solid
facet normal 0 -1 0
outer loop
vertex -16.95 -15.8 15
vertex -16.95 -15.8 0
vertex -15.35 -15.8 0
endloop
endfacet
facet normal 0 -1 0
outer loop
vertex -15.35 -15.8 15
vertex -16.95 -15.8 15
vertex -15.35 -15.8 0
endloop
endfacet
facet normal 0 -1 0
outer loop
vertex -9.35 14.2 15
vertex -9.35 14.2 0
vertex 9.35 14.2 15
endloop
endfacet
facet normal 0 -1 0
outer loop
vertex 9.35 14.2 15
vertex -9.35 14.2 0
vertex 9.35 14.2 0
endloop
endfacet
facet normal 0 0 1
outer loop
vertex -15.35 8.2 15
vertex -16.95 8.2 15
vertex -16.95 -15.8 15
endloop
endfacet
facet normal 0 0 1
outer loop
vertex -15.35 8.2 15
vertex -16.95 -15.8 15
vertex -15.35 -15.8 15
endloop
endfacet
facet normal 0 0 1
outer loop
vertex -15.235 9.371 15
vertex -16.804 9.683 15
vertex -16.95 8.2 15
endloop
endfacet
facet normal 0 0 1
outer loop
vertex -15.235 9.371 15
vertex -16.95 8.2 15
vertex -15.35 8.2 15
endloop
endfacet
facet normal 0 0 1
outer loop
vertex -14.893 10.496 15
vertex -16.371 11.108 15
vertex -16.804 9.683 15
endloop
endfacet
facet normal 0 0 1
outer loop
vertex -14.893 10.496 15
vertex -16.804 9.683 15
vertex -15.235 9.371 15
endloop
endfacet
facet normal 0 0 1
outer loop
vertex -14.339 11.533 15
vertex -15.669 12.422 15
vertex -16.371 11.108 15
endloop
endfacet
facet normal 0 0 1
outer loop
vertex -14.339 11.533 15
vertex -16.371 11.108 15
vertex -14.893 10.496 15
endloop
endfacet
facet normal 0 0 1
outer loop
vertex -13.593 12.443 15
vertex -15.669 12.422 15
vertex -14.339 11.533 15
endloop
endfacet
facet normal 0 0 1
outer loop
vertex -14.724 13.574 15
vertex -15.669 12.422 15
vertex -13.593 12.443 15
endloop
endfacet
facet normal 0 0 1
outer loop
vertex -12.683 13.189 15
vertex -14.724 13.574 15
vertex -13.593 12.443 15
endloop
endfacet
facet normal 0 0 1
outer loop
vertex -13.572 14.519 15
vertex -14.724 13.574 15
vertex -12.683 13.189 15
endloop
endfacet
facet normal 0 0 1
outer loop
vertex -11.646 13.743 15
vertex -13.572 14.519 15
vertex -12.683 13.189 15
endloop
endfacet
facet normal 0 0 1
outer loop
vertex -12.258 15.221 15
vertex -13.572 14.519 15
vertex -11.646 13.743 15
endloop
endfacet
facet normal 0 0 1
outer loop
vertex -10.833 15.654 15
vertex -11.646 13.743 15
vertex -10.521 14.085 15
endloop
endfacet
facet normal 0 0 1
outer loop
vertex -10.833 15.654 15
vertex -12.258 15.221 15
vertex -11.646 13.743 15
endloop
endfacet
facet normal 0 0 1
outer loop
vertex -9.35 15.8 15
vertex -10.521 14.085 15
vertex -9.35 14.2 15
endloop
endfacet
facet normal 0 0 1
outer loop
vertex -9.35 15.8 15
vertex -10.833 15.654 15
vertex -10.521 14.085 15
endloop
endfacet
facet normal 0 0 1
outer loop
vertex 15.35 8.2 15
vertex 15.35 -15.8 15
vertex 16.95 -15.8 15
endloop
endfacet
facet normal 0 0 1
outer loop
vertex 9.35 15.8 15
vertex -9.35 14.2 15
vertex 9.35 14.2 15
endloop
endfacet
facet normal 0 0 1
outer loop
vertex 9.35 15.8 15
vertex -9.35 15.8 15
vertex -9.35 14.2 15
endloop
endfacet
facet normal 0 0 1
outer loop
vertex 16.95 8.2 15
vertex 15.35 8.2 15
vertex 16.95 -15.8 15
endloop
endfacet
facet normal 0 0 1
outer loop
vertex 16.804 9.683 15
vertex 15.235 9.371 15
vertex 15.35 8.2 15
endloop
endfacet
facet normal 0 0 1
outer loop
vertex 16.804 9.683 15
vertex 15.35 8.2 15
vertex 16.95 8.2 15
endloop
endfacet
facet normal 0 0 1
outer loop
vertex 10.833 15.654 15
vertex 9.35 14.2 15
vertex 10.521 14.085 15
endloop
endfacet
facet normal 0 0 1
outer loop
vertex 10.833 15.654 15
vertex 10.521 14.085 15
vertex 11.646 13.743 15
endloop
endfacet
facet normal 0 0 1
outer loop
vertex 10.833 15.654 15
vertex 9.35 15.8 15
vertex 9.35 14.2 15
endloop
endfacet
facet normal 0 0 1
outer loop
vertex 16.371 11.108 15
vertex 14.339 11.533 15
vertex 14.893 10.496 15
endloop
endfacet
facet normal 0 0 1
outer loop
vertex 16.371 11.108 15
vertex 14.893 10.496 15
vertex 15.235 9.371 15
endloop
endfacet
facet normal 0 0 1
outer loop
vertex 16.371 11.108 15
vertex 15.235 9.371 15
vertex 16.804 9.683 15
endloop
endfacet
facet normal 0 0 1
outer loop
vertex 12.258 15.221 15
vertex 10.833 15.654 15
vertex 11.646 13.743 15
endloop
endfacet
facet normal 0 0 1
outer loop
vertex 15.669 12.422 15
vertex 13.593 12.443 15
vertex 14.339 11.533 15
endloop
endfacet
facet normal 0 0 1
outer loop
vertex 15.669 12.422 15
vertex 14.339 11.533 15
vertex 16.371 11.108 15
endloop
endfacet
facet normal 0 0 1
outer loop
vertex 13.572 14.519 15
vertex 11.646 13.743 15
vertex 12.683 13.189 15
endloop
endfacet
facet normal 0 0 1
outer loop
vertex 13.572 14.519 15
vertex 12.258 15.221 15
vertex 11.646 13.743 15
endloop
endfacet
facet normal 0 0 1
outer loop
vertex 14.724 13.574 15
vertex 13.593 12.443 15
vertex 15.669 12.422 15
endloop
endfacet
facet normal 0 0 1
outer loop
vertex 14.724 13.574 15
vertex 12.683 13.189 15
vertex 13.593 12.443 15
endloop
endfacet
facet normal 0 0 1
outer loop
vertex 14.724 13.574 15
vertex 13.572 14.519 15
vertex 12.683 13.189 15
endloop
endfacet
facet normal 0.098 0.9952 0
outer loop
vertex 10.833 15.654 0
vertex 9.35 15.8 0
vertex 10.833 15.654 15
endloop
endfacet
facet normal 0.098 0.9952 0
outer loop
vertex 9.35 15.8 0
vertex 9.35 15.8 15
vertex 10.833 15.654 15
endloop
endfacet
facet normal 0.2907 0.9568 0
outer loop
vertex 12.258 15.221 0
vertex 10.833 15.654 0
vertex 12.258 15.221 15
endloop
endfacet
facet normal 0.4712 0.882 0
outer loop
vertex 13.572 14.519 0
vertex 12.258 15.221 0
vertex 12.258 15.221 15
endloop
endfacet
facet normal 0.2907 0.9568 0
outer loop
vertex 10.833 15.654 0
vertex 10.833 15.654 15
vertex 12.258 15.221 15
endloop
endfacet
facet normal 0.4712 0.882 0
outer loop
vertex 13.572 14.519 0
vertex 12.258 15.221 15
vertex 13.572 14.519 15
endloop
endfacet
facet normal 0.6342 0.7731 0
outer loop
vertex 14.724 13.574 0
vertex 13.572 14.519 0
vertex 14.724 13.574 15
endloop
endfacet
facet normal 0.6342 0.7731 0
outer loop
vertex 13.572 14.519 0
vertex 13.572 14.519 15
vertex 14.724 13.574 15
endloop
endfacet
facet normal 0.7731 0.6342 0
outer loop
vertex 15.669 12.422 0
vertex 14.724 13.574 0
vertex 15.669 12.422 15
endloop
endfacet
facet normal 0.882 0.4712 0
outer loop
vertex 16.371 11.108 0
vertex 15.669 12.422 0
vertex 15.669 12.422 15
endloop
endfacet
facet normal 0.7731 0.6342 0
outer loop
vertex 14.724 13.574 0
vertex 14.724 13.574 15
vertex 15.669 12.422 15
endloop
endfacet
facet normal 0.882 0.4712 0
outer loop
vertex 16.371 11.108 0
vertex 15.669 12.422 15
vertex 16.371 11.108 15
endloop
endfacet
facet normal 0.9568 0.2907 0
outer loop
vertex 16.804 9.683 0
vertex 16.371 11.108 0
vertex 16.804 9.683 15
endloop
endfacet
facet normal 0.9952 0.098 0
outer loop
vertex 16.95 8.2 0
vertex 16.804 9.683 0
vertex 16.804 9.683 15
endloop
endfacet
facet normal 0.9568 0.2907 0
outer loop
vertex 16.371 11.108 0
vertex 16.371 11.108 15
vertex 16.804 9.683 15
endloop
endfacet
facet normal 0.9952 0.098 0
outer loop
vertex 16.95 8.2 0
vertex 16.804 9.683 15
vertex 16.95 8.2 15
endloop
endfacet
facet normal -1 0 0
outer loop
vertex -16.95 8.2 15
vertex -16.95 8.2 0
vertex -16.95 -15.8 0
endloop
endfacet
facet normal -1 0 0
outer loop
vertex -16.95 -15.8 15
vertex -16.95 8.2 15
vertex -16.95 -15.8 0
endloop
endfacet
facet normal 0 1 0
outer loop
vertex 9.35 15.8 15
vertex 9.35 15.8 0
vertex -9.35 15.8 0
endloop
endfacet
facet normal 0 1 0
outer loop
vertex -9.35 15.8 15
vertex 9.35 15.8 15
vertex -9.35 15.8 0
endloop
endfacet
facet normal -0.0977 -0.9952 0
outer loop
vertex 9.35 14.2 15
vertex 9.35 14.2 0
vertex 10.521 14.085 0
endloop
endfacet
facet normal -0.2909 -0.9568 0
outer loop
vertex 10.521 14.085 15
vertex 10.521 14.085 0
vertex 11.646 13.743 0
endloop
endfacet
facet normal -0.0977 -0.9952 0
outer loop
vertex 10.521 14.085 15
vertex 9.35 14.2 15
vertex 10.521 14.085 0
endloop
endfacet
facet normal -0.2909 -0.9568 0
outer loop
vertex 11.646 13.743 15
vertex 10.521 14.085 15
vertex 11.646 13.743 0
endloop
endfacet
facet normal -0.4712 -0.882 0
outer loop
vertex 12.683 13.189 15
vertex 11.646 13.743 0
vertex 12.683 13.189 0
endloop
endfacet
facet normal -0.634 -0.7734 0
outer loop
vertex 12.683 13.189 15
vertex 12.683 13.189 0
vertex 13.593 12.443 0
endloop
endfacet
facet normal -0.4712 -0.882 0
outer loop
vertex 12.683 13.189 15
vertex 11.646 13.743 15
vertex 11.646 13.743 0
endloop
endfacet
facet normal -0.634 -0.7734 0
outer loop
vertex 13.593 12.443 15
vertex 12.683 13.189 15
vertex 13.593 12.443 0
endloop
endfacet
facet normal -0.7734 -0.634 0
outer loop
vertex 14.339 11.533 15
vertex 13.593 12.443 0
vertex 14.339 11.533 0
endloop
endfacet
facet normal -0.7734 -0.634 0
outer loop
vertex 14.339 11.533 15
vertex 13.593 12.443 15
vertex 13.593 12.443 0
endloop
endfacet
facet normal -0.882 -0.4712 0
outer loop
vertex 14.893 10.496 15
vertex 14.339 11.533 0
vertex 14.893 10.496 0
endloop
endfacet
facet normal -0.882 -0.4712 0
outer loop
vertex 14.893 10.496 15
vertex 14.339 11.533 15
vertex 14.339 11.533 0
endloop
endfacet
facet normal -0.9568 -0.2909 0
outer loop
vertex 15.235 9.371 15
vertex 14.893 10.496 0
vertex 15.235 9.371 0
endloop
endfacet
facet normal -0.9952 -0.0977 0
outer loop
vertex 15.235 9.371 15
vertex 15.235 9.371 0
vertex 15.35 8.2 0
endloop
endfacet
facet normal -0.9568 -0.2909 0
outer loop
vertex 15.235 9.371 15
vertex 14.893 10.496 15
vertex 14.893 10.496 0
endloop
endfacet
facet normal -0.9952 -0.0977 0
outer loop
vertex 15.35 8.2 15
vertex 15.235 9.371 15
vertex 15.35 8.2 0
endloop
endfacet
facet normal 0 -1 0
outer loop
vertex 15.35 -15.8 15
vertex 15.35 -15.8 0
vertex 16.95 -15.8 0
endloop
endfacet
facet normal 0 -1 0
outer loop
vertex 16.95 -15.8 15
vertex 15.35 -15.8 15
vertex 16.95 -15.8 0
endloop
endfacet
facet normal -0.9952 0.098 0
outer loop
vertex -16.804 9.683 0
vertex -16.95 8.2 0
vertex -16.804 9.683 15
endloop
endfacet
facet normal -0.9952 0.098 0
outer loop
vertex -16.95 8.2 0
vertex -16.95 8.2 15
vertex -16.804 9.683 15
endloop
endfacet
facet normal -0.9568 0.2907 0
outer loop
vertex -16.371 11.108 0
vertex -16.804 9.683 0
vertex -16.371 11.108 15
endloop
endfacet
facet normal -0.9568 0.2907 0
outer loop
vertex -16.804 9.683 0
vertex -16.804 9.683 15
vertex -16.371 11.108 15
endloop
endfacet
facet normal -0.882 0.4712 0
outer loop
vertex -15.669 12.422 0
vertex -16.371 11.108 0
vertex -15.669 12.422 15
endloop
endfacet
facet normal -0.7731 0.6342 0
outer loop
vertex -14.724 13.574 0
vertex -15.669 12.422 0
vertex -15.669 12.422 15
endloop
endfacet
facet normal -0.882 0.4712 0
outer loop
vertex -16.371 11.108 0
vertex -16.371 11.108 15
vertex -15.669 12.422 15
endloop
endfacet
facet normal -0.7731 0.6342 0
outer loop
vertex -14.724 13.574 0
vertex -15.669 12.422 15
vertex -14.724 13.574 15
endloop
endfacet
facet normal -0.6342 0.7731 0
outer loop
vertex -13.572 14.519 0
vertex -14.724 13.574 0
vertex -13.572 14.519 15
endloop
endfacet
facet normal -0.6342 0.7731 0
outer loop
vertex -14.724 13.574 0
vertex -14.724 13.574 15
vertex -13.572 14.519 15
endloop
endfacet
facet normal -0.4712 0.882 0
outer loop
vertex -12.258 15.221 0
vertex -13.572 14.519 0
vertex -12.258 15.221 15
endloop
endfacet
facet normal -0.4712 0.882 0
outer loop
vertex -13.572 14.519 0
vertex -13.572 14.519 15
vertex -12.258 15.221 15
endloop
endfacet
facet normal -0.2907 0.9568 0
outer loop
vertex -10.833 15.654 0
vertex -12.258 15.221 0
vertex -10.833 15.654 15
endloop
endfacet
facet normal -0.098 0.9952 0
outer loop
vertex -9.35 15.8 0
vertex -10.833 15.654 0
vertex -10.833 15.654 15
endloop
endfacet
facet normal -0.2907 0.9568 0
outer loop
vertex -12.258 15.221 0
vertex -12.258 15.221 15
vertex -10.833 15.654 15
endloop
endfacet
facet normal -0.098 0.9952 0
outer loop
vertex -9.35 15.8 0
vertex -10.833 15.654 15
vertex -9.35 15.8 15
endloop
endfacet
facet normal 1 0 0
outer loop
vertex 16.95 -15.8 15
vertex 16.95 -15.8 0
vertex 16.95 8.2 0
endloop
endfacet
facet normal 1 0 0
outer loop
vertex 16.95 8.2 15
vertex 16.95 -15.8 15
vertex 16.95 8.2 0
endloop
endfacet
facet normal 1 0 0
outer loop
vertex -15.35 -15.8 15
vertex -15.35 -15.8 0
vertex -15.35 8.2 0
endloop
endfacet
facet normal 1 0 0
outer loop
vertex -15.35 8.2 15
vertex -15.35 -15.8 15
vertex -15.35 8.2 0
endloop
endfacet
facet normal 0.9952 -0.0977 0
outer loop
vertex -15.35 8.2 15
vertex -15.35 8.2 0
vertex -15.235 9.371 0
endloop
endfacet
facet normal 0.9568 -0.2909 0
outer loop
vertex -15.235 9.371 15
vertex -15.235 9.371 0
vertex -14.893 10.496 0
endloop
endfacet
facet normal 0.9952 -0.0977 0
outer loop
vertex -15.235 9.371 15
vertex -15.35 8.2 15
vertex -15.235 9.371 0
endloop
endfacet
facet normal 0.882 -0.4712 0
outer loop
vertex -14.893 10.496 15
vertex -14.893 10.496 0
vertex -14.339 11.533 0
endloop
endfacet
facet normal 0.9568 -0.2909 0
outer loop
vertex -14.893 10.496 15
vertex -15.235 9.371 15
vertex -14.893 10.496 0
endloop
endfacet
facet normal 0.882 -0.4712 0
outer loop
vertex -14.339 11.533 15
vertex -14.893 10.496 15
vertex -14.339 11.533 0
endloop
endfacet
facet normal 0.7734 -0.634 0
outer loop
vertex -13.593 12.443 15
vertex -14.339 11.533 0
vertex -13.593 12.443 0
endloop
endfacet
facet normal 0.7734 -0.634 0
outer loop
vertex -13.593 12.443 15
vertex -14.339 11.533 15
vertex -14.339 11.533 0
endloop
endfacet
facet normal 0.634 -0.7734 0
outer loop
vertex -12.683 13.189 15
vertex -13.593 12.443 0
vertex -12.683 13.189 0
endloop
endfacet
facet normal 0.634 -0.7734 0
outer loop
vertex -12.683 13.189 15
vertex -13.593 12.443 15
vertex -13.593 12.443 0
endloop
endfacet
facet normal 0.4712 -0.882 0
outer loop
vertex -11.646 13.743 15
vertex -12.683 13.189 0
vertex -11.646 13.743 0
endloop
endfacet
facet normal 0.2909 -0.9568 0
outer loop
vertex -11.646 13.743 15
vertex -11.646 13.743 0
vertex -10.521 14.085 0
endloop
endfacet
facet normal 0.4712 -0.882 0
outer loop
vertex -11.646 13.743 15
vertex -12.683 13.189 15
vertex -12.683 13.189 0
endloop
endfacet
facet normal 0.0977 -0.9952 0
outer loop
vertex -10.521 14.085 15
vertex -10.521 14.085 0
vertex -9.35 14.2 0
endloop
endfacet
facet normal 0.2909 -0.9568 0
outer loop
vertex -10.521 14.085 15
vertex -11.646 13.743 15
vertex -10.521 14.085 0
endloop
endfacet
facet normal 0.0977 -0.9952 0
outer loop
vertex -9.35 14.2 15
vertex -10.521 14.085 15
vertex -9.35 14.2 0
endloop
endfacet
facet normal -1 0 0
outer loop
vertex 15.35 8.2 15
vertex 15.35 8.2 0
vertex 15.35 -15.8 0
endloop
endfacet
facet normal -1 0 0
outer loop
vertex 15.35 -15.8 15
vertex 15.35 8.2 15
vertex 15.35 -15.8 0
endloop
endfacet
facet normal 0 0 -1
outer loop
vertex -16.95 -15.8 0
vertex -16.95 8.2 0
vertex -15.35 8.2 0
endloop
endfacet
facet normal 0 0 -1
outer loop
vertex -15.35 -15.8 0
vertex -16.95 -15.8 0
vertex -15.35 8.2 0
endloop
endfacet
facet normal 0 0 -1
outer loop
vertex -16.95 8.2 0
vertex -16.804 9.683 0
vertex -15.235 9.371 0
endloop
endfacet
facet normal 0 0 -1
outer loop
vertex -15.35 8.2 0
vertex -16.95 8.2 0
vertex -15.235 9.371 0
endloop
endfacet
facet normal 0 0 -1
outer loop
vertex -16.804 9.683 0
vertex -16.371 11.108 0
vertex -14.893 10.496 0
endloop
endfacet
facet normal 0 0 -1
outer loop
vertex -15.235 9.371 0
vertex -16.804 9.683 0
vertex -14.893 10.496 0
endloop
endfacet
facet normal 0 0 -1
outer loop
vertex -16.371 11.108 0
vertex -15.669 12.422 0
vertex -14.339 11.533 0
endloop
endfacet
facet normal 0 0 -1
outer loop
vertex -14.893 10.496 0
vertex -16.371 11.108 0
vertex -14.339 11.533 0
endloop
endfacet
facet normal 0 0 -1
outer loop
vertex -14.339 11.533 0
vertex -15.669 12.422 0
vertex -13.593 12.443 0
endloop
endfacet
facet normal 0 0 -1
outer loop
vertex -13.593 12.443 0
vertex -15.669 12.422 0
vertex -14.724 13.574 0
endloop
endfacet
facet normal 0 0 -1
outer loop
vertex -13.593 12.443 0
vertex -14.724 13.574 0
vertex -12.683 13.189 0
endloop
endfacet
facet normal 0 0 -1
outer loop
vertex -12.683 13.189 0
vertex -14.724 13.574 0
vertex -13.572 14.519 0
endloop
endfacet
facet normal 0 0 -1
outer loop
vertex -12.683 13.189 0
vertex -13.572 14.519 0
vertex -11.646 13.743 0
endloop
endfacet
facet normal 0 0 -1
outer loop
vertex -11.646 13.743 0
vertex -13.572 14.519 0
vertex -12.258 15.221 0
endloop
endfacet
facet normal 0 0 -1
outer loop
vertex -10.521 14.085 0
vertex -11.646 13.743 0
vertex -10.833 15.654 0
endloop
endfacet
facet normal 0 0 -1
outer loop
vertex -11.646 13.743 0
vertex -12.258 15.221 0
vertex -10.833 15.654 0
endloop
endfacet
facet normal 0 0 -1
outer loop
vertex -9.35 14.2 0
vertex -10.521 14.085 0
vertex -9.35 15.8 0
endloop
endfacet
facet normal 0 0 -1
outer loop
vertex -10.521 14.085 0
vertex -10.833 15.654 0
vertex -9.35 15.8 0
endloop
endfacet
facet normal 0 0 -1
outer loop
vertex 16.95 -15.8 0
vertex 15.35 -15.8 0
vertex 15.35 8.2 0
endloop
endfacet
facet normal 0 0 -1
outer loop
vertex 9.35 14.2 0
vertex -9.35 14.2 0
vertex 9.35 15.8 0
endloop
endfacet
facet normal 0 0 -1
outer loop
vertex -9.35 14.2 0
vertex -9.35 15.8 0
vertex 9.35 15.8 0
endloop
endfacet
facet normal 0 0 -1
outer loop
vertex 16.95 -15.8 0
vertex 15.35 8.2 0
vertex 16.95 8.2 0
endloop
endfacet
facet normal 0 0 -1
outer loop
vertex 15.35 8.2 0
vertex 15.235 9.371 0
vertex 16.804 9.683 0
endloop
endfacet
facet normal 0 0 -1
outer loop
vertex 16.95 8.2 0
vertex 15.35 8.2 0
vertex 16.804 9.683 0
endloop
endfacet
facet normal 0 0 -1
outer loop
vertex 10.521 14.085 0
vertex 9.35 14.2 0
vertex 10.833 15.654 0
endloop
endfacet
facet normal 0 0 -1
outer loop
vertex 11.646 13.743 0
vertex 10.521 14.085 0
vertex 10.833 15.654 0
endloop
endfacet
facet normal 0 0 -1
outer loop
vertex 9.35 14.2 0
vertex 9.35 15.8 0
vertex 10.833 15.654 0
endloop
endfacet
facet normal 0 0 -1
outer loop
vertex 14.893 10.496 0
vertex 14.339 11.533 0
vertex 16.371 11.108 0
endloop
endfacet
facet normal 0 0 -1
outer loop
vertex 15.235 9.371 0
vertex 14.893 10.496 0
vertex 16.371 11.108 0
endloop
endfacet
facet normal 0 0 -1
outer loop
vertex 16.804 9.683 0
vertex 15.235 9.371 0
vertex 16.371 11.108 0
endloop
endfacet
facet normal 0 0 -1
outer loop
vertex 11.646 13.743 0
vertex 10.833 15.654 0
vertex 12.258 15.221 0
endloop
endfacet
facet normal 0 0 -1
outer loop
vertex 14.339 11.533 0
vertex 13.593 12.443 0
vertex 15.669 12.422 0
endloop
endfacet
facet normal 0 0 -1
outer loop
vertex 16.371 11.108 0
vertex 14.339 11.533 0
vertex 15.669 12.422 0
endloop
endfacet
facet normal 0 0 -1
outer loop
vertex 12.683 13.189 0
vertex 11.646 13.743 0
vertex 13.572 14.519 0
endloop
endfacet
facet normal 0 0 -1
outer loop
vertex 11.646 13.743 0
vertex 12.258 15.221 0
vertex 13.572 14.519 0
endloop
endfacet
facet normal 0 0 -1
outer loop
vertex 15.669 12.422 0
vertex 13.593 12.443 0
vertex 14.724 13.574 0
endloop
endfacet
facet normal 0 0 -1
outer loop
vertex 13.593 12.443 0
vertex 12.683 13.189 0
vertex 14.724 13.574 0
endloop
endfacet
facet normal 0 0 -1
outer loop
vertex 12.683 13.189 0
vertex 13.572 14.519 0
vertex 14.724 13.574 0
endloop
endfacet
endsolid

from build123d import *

# Parameters (mm, degrees)
F1_DEPTH = 15
F2_R     = 6
F3_R     = 7.6


with BuildPart() as f1:
    # F0 (on Top) → F1 (new body)
    with BuildSketch(Plane.XY):
        Polygon((-16.95, -15.8), (-15.35, -15.8), (-15.35, 14.2), (15.35, 14.2), (15.35, -15.8), (16.95, -15.8), (16.95, 15.8), (-16.95, 15.8), align=None)
    extrude(amount=F1_DEPTH)

    # F2
    f2_edges = [f1.edges().sort_by_distance(p)[0] for p in [
        (-15.35, 14.2, 7.5),
        (15.35, 14.2, 7.5),
    ]]
    fillet(f2_edges, radius=F2_R)

    # F3
    f3_edges = [f1.edges().sort_by_distance(p)[0] for p in [
        (-16.95, 15.8, 7.5),
        (16.95, 15.8, 7.5),
    ]]
    fillet(f3_edges, radius=F3_R)


solid = f1.part
